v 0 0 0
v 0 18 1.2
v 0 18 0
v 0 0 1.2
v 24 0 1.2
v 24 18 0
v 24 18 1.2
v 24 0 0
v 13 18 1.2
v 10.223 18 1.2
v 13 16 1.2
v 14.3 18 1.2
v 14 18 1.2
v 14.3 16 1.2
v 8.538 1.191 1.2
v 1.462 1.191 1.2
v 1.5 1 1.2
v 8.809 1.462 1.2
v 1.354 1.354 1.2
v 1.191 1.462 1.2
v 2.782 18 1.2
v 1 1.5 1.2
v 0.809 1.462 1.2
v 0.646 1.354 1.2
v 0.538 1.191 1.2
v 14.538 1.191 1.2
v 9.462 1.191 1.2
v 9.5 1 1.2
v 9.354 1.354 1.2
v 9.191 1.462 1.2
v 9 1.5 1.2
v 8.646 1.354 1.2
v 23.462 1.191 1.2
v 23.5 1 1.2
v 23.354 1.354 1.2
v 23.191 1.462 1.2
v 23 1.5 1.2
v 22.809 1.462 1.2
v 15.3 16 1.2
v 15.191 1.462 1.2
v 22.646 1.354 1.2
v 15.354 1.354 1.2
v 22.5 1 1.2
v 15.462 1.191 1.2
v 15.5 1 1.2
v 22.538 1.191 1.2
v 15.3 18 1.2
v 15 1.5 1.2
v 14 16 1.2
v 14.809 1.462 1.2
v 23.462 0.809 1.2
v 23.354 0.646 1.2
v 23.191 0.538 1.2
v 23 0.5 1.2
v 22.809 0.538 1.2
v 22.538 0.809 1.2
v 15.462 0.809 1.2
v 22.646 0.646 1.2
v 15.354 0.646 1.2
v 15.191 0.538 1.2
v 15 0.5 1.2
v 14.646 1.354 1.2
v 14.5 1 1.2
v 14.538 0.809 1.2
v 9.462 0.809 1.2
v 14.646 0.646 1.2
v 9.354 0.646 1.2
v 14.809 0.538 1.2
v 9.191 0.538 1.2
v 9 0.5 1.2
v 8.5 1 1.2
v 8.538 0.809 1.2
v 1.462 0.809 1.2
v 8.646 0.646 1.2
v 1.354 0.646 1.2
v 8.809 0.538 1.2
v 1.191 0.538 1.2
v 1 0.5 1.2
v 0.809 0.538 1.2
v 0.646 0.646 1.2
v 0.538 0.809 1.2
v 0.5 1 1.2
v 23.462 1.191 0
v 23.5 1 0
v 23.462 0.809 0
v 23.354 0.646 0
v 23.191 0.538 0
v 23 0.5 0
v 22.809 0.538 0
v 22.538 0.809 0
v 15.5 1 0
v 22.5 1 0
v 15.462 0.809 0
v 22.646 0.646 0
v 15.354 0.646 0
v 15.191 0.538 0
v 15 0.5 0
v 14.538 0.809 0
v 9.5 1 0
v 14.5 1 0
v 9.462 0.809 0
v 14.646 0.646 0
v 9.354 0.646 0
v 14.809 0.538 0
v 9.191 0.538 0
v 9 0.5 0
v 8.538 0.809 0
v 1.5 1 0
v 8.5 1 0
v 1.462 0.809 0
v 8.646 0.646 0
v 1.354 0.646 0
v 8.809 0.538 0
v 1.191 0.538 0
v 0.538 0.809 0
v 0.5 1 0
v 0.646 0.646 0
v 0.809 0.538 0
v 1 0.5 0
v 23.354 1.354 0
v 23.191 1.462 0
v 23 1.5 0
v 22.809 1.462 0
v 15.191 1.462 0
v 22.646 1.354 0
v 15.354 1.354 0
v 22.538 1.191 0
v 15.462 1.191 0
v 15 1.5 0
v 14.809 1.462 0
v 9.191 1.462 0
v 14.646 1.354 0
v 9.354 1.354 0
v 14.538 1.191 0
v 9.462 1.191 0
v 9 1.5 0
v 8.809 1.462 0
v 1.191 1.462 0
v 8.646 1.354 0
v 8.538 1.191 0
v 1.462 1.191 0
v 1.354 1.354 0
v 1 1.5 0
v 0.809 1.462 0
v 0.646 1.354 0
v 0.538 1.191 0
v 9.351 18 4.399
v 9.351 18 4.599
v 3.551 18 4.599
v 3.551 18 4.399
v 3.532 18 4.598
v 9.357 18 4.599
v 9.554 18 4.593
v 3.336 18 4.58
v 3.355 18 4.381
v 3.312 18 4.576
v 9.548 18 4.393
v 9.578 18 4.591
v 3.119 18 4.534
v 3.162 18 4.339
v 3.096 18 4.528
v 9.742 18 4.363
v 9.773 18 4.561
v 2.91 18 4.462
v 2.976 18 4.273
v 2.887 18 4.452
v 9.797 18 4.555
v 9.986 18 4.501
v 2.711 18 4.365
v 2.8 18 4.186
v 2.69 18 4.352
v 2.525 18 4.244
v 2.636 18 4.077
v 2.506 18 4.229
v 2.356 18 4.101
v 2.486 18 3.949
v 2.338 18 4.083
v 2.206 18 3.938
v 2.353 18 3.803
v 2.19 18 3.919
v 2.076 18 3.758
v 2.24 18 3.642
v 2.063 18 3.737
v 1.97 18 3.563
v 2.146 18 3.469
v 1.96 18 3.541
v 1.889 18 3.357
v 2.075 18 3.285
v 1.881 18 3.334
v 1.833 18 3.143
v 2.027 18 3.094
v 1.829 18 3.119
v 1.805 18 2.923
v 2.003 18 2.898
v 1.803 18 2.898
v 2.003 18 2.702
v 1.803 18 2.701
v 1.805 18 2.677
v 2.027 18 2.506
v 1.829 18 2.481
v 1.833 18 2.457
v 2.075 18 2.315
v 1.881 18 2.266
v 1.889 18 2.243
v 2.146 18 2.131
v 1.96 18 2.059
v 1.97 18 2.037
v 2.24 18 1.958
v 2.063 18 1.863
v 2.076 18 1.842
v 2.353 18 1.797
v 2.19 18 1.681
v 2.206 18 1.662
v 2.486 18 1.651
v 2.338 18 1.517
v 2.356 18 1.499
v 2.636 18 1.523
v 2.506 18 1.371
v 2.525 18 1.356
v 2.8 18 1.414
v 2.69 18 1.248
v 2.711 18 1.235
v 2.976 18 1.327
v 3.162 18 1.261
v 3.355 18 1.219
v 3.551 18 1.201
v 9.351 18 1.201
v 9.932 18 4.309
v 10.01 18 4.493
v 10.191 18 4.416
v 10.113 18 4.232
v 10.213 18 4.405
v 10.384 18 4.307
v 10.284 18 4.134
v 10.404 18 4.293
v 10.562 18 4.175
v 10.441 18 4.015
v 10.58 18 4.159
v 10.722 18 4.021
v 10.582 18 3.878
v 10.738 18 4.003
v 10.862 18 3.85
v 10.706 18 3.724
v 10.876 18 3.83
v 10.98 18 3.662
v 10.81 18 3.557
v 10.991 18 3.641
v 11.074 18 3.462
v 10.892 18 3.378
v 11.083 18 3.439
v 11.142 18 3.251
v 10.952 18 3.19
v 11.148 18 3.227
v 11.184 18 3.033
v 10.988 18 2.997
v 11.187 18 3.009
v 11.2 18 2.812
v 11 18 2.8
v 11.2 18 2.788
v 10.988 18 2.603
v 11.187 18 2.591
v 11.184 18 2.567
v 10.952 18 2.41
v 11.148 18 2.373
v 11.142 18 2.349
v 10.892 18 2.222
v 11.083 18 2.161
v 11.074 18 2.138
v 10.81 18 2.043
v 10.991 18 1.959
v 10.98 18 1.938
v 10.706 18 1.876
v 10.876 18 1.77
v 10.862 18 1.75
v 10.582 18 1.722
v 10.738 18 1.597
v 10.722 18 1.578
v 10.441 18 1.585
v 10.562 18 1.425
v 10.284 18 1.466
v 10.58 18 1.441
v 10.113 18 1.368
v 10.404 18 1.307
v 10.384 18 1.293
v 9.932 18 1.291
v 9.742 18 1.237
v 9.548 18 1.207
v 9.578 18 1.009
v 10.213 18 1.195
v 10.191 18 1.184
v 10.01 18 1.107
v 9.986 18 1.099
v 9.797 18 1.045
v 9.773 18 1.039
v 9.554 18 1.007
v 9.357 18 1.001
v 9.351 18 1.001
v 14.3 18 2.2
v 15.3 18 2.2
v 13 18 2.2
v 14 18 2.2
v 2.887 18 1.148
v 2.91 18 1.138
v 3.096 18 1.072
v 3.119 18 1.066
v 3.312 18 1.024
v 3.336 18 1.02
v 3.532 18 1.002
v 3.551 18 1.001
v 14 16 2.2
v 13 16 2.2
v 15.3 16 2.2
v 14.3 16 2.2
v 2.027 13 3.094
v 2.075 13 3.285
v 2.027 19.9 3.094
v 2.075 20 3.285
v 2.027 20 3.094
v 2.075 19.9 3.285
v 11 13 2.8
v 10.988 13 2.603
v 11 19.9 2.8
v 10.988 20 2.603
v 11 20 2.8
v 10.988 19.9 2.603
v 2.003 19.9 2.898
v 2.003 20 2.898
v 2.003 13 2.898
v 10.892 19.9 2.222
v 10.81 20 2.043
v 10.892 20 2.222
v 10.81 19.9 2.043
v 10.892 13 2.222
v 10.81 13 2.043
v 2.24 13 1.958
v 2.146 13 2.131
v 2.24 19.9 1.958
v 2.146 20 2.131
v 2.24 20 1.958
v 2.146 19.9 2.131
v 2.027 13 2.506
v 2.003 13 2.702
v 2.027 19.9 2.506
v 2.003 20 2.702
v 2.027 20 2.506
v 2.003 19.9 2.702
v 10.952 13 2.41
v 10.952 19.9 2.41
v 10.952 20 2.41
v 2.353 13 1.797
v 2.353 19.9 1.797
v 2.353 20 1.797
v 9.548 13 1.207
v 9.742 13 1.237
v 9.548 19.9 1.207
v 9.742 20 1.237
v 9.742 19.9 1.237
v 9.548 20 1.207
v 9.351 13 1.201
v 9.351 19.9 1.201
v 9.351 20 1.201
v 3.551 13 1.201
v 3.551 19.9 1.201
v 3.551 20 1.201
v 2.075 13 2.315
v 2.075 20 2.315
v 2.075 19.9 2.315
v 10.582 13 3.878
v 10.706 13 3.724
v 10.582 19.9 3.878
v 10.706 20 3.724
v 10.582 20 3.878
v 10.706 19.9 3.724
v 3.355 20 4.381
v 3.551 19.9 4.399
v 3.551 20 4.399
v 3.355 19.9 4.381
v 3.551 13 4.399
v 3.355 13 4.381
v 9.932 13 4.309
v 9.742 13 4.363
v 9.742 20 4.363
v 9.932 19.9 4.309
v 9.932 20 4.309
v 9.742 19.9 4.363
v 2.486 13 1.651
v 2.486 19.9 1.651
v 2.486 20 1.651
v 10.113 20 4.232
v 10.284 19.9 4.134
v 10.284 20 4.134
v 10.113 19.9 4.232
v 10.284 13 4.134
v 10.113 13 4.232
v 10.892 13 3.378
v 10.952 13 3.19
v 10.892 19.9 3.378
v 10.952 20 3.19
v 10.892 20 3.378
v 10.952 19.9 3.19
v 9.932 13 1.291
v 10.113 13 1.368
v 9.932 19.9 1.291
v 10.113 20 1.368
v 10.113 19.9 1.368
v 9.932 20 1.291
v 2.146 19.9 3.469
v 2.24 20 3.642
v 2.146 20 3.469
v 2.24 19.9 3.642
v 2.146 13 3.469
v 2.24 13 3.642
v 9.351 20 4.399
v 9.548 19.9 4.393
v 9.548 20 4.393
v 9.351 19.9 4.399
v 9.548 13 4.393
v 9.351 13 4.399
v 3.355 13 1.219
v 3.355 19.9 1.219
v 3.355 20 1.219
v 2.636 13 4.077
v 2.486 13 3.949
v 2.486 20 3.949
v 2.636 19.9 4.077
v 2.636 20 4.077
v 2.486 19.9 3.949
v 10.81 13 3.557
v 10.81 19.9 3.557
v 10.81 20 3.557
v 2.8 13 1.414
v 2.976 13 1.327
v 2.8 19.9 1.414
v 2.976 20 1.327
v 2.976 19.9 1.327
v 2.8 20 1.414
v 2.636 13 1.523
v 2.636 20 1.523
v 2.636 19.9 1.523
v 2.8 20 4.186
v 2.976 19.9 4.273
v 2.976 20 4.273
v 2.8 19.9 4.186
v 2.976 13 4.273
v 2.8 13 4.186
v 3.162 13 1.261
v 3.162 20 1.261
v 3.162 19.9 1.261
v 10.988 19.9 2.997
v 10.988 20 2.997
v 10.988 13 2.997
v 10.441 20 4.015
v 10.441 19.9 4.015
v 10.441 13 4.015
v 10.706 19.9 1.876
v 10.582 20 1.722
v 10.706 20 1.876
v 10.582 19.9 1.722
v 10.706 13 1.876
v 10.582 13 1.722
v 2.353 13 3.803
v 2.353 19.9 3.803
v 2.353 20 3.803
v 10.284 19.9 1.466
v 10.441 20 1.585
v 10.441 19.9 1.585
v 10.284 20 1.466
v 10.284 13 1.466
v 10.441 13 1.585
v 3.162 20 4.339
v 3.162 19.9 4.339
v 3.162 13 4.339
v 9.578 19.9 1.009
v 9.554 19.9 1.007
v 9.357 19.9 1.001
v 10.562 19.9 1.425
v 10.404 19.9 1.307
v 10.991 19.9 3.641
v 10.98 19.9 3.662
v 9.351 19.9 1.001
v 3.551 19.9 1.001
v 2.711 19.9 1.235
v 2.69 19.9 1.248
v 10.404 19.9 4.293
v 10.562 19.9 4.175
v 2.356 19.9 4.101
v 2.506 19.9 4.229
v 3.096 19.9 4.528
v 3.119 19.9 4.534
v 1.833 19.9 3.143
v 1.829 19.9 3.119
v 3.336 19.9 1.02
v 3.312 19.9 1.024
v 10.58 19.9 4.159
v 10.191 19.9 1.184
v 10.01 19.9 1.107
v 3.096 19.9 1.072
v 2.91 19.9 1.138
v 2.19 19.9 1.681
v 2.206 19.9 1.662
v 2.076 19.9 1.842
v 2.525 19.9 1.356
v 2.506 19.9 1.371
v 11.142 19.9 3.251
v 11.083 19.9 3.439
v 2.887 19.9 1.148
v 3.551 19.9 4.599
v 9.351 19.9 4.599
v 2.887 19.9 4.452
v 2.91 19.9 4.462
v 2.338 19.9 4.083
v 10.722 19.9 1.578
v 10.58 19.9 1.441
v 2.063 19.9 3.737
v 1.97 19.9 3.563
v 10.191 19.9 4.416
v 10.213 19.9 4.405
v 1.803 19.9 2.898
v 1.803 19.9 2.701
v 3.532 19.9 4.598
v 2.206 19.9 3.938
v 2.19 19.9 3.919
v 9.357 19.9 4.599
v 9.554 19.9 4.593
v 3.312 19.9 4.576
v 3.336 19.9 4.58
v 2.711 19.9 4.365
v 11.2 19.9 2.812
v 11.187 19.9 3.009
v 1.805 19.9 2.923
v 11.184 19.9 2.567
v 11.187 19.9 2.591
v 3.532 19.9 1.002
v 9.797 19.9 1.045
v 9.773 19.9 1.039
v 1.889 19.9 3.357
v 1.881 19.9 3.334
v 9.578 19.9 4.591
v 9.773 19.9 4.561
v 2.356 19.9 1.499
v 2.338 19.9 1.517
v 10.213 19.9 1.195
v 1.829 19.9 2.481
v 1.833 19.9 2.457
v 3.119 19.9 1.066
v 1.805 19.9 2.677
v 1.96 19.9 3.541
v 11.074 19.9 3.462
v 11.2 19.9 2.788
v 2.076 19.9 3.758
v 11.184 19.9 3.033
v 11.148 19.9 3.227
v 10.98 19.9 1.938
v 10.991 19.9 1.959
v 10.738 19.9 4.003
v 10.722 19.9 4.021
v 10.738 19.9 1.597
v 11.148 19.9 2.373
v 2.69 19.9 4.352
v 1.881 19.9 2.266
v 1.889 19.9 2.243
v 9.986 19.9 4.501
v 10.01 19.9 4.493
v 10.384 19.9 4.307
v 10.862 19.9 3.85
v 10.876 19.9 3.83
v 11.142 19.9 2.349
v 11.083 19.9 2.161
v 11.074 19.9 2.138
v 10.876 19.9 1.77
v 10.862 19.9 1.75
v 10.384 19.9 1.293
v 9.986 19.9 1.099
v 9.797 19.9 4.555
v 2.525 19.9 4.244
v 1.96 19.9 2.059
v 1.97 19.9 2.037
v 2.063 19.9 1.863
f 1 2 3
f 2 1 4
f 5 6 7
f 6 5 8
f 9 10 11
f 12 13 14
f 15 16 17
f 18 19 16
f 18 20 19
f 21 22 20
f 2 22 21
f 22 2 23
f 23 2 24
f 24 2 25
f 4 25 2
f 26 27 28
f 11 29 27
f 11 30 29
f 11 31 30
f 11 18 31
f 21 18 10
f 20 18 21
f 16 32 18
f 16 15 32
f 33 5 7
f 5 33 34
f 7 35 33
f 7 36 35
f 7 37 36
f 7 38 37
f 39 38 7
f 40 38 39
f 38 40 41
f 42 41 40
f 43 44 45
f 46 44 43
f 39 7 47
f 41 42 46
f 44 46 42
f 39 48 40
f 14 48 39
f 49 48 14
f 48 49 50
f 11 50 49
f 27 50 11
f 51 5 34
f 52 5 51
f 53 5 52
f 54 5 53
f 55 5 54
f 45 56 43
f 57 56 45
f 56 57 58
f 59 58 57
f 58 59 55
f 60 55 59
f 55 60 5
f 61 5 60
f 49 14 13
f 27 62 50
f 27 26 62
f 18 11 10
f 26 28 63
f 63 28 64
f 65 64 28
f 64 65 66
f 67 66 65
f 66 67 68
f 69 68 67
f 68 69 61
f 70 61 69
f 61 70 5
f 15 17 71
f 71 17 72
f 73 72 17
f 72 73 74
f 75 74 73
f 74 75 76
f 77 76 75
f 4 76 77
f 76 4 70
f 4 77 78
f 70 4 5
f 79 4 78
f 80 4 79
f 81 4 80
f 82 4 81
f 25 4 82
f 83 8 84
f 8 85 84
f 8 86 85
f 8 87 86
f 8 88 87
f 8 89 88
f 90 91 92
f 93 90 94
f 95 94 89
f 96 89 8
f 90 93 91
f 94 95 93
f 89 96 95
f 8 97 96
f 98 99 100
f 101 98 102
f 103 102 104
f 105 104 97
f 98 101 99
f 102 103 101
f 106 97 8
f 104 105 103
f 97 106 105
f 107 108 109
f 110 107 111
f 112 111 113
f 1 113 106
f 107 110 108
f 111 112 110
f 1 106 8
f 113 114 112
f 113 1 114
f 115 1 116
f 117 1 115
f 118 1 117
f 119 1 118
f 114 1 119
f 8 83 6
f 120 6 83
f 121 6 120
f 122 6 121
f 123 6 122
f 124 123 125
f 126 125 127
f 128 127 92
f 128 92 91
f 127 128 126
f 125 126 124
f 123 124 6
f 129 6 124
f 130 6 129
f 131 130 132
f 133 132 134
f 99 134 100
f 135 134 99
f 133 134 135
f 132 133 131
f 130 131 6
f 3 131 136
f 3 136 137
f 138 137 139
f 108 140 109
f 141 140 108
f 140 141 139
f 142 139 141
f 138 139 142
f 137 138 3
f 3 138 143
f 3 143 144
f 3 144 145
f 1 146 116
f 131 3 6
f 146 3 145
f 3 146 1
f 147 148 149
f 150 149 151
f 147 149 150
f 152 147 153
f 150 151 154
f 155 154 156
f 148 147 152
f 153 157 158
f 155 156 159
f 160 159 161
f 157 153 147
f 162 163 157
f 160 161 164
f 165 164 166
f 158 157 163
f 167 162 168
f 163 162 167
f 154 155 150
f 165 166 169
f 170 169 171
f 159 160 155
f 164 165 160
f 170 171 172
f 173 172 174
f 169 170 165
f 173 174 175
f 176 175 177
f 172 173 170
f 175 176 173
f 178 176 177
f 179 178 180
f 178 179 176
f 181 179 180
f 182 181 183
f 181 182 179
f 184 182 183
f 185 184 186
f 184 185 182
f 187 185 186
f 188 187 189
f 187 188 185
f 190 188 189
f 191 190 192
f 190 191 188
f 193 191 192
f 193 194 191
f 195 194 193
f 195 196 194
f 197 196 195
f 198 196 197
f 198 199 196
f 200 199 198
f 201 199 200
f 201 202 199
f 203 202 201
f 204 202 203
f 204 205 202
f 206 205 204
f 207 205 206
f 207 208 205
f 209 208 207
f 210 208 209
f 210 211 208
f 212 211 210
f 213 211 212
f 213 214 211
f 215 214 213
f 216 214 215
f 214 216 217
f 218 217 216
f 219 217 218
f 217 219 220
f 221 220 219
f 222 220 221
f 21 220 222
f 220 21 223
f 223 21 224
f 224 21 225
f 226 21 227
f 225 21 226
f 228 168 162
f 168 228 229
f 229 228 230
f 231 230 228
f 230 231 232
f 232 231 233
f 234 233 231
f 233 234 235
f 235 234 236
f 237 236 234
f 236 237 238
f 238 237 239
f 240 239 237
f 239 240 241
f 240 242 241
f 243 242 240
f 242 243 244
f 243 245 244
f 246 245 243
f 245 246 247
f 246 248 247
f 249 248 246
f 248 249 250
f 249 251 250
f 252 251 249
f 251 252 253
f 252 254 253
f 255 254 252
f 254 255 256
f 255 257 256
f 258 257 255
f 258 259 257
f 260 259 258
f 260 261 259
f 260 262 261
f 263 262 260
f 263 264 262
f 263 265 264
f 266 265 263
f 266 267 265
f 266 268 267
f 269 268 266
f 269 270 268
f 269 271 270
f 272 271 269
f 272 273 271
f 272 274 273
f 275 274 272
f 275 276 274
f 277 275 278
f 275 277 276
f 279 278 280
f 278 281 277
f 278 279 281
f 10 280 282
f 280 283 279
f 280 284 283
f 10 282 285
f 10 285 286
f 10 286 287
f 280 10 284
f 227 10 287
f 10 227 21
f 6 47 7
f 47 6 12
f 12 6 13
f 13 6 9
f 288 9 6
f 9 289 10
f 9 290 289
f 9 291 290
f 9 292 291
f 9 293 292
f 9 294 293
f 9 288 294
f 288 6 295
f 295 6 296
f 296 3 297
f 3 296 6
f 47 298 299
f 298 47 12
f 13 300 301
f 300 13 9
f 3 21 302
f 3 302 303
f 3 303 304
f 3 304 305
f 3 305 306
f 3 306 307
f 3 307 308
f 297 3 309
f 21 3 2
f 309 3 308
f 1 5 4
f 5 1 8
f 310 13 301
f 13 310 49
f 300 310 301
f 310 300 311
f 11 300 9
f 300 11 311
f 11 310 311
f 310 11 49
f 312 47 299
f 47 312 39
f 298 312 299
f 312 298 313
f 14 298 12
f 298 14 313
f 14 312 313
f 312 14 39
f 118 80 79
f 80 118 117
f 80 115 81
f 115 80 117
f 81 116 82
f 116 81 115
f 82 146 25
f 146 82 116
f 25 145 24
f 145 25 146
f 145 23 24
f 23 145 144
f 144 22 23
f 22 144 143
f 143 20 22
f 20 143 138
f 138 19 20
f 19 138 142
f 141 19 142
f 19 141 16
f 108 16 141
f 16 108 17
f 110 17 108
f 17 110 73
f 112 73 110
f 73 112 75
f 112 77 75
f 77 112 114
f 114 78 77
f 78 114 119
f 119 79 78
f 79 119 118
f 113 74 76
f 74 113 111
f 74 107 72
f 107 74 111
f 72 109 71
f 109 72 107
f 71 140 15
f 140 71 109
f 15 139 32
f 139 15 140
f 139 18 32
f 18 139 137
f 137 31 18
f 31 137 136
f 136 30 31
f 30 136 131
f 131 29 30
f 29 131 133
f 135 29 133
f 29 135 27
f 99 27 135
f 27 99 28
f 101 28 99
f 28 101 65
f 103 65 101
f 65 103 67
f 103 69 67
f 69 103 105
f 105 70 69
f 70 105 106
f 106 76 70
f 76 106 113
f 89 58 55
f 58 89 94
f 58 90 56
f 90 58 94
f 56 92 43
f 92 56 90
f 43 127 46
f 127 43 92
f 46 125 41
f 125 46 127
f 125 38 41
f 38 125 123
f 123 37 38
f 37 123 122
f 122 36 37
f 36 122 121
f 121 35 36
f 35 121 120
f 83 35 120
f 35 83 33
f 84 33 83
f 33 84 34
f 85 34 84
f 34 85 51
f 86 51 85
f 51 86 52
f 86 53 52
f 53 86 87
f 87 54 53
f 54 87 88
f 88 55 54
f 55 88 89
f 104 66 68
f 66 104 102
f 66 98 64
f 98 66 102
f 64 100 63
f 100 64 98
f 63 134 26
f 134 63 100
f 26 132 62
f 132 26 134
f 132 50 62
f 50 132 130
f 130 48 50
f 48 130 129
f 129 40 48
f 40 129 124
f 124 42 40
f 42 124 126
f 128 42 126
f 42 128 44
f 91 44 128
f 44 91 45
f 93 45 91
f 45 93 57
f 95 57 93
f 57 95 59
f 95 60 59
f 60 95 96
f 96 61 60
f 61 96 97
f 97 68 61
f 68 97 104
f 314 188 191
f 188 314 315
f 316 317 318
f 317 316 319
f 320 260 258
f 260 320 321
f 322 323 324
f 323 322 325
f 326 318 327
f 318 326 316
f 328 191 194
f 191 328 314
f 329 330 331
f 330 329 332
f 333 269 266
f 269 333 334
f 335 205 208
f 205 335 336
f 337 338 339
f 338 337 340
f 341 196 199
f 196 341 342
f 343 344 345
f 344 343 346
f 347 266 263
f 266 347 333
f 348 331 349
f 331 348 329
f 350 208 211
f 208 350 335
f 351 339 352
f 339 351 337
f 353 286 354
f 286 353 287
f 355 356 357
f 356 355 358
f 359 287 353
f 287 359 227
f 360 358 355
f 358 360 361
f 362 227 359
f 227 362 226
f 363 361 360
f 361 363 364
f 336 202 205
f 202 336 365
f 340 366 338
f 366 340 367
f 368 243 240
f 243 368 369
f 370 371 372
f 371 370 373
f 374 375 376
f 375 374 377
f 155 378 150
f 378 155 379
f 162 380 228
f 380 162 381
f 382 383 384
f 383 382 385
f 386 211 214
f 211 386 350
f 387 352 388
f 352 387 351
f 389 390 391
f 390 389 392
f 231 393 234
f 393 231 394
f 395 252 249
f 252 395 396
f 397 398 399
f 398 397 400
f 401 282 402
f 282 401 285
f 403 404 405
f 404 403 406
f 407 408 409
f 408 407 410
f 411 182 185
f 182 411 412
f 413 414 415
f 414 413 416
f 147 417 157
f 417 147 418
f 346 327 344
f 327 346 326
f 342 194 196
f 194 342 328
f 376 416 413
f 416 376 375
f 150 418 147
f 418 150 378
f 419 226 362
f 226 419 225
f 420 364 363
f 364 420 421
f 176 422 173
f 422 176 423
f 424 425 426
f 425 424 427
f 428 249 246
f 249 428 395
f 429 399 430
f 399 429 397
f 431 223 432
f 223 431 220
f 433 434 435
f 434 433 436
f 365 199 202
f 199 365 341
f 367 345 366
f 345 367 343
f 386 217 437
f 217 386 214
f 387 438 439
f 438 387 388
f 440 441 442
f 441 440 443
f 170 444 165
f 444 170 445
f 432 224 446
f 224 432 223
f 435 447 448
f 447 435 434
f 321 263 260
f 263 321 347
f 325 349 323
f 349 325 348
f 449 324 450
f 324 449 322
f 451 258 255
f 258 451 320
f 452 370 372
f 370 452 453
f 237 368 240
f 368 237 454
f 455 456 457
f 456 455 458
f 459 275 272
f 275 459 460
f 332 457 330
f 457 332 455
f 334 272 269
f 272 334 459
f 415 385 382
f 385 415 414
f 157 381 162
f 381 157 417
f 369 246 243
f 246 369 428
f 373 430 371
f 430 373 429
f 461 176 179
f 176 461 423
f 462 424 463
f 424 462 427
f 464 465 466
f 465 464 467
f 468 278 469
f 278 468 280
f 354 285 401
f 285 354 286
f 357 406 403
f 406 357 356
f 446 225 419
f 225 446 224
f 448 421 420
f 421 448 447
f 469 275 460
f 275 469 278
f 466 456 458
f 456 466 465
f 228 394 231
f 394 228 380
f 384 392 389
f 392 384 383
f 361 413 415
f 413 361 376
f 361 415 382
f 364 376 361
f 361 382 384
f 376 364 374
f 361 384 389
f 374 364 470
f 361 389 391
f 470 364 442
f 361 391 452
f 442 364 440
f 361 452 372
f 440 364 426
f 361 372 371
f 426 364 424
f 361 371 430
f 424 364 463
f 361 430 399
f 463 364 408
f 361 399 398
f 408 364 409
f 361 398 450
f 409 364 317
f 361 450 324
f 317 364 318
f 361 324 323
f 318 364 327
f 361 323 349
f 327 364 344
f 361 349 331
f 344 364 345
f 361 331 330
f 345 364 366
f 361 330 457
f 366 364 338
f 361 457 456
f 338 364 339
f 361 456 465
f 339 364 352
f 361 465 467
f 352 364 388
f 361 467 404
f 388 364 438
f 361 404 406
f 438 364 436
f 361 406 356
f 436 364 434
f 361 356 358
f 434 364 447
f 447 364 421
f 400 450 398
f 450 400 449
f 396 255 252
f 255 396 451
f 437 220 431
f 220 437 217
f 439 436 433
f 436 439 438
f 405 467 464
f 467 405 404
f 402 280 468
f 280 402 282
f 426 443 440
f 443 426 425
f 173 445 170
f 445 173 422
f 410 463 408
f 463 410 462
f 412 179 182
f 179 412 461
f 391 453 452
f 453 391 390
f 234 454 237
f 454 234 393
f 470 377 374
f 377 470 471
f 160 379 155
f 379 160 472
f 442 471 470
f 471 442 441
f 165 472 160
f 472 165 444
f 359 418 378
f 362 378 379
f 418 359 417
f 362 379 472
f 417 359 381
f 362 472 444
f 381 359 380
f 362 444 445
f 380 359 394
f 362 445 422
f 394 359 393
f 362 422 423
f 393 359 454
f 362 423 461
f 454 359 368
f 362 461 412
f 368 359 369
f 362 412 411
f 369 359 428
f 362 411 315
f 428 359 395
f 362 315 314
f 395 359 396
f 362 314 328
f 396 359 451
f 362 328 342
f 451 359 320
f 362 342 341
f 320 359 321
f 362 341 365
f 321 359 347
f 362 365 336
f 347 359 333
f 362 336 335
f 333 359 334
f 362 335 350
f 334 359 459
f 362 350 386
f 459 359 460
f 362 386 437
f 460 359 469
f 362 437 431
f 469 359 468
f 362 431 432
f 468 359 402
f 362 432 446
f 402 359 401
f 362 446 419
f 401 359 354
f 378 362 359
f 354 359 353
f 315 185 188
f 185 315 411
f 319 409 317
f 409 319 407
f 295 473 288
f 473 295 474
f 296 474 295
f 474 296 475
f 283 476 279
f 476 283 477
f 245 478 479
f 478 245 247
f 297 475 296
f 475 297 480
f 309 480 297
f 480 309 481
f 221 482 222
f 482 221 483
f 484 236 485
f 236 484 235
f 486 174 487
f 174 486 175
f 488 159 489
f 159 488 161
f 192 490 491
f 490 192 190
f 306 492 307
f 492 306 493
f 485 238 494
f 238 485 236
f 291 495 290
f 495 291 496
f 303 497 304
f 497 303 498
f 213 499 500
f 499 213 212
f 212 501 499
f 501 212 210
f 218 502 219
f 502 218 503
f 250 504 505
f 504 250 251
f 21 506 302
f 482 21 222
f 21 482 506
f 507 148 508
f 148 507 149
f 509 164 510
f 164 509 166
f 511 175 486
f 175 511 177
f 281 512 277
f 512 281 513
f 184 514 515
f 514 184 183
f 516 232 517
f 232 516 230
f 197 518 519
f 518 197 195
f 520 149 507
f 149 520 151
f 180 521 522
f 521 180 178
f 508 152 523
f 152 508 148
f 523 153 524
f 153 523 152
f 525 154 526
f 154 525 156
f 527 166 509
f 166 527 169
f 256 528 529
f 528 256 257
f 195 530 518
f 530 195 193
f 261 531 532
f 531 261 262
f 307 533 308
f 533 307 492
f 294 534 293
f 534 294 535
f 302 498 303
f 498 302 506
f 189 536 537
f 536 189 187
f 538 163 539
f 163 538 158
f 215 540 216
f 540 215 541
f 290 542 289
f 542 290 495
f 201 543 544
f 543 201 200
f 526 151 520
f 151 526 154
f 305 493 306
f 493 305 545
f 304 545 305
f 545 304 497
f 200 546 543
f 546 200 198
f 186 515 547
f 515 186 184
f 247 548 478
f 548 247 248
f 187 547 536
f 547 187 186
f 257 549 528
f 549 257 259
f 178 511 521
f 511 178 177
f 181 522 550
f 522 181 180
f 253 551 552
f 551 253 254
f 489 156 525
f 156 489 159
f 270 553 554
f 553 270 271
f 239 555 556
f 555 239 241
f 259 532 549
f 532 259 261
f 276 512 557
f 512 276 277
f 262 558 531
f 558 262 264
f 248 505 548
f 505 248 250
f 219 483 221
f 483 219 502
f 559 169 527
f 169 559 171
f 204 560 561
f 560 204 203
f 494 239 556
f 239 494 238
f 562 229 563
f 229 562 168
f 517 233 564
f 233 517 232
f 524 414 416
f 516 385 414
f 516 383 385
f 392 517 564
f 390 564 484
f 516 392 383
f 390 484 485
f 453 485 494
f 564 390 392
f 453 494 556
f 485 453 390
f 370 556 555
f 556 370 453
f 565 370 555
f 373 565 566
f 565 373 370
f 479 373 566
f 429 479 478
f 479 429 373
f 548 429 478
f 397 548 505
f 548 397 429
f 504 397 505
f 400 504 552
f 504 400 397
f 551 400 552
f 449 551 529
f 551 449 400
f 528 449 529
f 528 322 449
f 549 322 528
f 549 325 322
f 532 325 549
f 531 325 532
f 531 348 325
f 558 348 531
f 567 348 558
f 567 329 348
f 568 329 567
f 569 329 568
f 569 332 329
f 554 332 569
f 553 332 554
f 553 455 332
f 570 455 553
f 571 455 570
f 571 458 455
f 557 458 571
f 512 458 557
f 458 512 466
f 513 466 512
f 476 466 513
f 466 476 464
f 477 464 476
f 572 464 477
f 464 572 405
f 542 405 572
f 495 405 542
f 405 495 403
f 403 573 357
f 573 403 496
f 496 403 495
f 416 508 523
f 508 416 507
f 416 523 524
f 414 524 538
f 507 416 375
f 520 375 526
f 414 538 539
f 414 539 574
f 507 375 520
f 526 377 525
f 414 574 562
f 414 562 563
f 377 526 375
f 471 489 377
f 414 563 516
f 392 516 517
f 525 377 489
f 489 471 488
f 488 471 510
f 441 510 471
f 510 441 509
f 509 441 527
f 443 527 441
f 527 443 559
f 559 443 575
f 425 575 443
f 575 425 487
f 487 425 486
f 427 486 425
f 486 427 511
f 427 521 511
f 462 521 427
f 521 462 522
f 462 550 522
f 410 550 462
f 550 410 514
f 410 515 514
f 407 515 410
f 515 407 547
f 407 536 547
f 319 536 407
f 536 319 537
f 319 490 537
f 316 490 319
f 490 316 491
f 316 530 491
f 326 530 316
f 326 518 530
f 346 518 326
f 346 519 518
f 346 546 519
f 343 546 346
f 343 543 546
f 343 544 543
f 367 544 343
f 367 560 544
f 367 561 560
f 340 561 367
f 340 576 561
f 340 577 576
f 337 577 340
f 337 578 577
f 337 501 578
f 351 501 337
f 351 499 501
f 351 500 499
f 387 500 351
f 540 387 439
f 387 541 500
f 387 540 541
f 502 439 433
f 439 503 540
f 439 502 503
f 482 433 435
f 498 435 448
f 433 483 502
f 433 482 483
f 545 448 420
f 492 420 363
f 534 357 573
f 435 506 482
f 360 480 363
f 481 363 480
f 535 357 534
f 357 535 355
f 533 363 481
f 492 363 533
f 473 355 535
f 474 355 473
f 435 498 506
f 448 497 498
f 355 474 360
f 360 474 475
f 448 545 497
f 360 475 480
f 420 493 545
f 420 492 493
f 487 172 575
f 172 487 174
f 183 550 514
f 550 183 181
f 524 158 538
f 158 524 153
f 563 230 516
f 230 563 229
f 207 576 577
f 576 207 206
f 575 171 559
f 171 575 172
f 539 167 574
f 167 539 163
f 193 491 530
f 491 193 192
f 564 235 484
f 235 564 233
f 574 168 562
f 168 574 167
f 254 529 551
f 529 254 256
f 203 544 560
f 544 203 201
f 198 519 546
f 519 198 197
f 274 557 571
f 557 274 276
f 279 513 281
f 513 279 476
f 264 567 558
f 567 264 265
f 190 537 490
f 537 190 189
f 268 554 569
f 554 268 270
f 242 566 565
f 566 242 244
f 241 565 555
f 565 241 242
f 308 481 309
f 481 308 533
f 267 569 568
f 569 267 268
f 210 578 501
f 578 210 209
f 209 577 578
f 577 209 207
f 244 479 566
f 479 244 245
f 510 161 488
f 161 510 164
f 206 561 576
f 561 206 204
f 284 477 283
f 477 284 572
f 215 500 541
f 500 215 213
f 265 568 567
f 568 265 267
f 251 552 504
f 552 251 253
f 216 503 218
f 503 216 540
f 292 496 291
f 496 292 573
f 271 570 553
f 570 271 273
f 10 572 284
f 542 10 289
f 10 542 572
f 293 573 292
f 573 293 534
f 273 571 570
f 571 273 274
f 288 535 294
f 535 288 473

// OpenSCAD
use <bendlib.scad>;

function cms4056t(
    board_dim = undef,
    typec_dim = undef,
    typec_offset = undef,
    led_dim = undef,
    led_offsets = undef,
    pad_dim = undef,
    pad_hole_dia = undef,
    pad_offsets = undef
) = let(
    board_dim = bl_def(board_dim, [24, 18, 1.2]),
    typec_dim = bl_def(typec_dim, [9, 7, 3.2]),
    dim = board_dim + [0,0,typec_dim[2]],
    typec_offset = bl_def(typec_offset, [2, board_dim[1] - typec_dim[1] + 2, board_dim[2]]),
    led_dim = bl_def(led_dim, [1,2,1]),
    led_offsets = bl_def(led_offsets, [
        [13, board_dim[1]-led_dim[1], board_dim[2]],
        [14.3, board_dim[1]-led_dim[1], board_dim[2]]
    ]),
    pad_dim = bl_def(pad_dim, [2,2]),
    pad_hole_dia = bl_def(pad_hole_dia, 1),
    pad_offsets = bl_def(pad_offsets, [
        [0,0], 
        [8,0], 
        [board_dim[0]-pad_dim[0], 0], 
        [board_dim[0]-pad_dim[0] - 8, 0]
    ])
) [
    board_dim,
    typec_dim,
    dim,
    typec_offset,
    led_dim,
    led_offsets,
    pad_dim,
    pad_hole_dia,
    pad_offsets
];

function cms4056t_board_dim(type = cms4056t()) = type[0];
function cms4056t_typec_dim(type = cms4056t()) = type[1];
function cms4056t_dim(type = cms4056t()) = type[2];
function cms4056t_typec_offset(type = cms4056t()) = type[3];
function cms4056t_led_dim(type = cms4056t()) = type[4];
function cms4056t_led_offsets(type = cms4056t()) = type[5];
function cms4056t_pad_dim(type = cms4056t()) = type[6];
function cms4056t_pad_hole_dia(type = cms4056t()) = type[7];
function cms4056t_pad_offsets(type = cms4056t()) = type[8];

module cms4056t_typec_shape(type) {
    typec_dim = cms4056t_typec_dim(type);
    bl_hull_circle(typec_dim[2], typec_dim[0]);
}

module cms4056t_typec_diff(type, thickness, tolerance, axial_tolerance = undef, part_offset = undef) {
    axial_tolerance = bl_def(axial_tolerance, tolerance);
    part_offset = bl_def(part_offset, axial_tolerance);
    
    typec_offset = cms4056t_typec_offset(type);
    board_dim = cms4056t_board_dim(type);
    
    translate([typec_offset[0], board_dim[1] + part_offset, typec_offset[2]])
    rotate([90,0,0])
    translate([0,0,-thickness-axial_tolerance])
    linear_extrude(thickness + axial_tolerance*2)
    offset(tolerance)
    cms4056t_typec_shape(type);
}

module cms4056t(type = cms4056t()) {
    
    board_dim = cms4056t_board_dim(type);
    typec_dim = cms4056t_typec_dim(type);
    typec_offset = cms4056t_typec_offset(type);
    led_dim = cms4056t_led_dim(type);
    led_offsets = cms4056t_led_offsets(type);
    pad_dim = cms4056t_pad_dim(type);
    pad_hole_dia = cms4056t_pad_hole_dia(type);
    pad_offsets = cms4056t_pad_offsets(type);

    color("black")
    difference() {
        cube(board_dim);
        translate([0,-1,-1])
        for (off = pad_offsets) {
            translate(off)
            cube([pad_dim[0], pad_dim[1]+1, board_dim[2]+2]);
        }
    }
    
    translate(typec_offset)
    translate([0,0,typec_dim[2]])
    rotate([-90,0,0])
    linear_extrude(typec_dim[1])
    cms4056t_typec_shape(type);
    
    color("blue")
    for (off = led_offsets) {
        translate(off)
        cube(led_dim);
    }
    
    color("lightgray")
    for (off = pad_offsets) {
        translate(off)
        linear_extrude(board_dim[2])
        translate(pad_dim/2)
        difference() {
            square(pad_dim, center=true);
            circle(d = pad_hole_dia);
        }
    }

}

$fa = 0.2;
$fs = 0.2;
cms4056t(cms4056t());

#cms4056t_typec_diff(cms4056t(), 1.5, 0.2);
